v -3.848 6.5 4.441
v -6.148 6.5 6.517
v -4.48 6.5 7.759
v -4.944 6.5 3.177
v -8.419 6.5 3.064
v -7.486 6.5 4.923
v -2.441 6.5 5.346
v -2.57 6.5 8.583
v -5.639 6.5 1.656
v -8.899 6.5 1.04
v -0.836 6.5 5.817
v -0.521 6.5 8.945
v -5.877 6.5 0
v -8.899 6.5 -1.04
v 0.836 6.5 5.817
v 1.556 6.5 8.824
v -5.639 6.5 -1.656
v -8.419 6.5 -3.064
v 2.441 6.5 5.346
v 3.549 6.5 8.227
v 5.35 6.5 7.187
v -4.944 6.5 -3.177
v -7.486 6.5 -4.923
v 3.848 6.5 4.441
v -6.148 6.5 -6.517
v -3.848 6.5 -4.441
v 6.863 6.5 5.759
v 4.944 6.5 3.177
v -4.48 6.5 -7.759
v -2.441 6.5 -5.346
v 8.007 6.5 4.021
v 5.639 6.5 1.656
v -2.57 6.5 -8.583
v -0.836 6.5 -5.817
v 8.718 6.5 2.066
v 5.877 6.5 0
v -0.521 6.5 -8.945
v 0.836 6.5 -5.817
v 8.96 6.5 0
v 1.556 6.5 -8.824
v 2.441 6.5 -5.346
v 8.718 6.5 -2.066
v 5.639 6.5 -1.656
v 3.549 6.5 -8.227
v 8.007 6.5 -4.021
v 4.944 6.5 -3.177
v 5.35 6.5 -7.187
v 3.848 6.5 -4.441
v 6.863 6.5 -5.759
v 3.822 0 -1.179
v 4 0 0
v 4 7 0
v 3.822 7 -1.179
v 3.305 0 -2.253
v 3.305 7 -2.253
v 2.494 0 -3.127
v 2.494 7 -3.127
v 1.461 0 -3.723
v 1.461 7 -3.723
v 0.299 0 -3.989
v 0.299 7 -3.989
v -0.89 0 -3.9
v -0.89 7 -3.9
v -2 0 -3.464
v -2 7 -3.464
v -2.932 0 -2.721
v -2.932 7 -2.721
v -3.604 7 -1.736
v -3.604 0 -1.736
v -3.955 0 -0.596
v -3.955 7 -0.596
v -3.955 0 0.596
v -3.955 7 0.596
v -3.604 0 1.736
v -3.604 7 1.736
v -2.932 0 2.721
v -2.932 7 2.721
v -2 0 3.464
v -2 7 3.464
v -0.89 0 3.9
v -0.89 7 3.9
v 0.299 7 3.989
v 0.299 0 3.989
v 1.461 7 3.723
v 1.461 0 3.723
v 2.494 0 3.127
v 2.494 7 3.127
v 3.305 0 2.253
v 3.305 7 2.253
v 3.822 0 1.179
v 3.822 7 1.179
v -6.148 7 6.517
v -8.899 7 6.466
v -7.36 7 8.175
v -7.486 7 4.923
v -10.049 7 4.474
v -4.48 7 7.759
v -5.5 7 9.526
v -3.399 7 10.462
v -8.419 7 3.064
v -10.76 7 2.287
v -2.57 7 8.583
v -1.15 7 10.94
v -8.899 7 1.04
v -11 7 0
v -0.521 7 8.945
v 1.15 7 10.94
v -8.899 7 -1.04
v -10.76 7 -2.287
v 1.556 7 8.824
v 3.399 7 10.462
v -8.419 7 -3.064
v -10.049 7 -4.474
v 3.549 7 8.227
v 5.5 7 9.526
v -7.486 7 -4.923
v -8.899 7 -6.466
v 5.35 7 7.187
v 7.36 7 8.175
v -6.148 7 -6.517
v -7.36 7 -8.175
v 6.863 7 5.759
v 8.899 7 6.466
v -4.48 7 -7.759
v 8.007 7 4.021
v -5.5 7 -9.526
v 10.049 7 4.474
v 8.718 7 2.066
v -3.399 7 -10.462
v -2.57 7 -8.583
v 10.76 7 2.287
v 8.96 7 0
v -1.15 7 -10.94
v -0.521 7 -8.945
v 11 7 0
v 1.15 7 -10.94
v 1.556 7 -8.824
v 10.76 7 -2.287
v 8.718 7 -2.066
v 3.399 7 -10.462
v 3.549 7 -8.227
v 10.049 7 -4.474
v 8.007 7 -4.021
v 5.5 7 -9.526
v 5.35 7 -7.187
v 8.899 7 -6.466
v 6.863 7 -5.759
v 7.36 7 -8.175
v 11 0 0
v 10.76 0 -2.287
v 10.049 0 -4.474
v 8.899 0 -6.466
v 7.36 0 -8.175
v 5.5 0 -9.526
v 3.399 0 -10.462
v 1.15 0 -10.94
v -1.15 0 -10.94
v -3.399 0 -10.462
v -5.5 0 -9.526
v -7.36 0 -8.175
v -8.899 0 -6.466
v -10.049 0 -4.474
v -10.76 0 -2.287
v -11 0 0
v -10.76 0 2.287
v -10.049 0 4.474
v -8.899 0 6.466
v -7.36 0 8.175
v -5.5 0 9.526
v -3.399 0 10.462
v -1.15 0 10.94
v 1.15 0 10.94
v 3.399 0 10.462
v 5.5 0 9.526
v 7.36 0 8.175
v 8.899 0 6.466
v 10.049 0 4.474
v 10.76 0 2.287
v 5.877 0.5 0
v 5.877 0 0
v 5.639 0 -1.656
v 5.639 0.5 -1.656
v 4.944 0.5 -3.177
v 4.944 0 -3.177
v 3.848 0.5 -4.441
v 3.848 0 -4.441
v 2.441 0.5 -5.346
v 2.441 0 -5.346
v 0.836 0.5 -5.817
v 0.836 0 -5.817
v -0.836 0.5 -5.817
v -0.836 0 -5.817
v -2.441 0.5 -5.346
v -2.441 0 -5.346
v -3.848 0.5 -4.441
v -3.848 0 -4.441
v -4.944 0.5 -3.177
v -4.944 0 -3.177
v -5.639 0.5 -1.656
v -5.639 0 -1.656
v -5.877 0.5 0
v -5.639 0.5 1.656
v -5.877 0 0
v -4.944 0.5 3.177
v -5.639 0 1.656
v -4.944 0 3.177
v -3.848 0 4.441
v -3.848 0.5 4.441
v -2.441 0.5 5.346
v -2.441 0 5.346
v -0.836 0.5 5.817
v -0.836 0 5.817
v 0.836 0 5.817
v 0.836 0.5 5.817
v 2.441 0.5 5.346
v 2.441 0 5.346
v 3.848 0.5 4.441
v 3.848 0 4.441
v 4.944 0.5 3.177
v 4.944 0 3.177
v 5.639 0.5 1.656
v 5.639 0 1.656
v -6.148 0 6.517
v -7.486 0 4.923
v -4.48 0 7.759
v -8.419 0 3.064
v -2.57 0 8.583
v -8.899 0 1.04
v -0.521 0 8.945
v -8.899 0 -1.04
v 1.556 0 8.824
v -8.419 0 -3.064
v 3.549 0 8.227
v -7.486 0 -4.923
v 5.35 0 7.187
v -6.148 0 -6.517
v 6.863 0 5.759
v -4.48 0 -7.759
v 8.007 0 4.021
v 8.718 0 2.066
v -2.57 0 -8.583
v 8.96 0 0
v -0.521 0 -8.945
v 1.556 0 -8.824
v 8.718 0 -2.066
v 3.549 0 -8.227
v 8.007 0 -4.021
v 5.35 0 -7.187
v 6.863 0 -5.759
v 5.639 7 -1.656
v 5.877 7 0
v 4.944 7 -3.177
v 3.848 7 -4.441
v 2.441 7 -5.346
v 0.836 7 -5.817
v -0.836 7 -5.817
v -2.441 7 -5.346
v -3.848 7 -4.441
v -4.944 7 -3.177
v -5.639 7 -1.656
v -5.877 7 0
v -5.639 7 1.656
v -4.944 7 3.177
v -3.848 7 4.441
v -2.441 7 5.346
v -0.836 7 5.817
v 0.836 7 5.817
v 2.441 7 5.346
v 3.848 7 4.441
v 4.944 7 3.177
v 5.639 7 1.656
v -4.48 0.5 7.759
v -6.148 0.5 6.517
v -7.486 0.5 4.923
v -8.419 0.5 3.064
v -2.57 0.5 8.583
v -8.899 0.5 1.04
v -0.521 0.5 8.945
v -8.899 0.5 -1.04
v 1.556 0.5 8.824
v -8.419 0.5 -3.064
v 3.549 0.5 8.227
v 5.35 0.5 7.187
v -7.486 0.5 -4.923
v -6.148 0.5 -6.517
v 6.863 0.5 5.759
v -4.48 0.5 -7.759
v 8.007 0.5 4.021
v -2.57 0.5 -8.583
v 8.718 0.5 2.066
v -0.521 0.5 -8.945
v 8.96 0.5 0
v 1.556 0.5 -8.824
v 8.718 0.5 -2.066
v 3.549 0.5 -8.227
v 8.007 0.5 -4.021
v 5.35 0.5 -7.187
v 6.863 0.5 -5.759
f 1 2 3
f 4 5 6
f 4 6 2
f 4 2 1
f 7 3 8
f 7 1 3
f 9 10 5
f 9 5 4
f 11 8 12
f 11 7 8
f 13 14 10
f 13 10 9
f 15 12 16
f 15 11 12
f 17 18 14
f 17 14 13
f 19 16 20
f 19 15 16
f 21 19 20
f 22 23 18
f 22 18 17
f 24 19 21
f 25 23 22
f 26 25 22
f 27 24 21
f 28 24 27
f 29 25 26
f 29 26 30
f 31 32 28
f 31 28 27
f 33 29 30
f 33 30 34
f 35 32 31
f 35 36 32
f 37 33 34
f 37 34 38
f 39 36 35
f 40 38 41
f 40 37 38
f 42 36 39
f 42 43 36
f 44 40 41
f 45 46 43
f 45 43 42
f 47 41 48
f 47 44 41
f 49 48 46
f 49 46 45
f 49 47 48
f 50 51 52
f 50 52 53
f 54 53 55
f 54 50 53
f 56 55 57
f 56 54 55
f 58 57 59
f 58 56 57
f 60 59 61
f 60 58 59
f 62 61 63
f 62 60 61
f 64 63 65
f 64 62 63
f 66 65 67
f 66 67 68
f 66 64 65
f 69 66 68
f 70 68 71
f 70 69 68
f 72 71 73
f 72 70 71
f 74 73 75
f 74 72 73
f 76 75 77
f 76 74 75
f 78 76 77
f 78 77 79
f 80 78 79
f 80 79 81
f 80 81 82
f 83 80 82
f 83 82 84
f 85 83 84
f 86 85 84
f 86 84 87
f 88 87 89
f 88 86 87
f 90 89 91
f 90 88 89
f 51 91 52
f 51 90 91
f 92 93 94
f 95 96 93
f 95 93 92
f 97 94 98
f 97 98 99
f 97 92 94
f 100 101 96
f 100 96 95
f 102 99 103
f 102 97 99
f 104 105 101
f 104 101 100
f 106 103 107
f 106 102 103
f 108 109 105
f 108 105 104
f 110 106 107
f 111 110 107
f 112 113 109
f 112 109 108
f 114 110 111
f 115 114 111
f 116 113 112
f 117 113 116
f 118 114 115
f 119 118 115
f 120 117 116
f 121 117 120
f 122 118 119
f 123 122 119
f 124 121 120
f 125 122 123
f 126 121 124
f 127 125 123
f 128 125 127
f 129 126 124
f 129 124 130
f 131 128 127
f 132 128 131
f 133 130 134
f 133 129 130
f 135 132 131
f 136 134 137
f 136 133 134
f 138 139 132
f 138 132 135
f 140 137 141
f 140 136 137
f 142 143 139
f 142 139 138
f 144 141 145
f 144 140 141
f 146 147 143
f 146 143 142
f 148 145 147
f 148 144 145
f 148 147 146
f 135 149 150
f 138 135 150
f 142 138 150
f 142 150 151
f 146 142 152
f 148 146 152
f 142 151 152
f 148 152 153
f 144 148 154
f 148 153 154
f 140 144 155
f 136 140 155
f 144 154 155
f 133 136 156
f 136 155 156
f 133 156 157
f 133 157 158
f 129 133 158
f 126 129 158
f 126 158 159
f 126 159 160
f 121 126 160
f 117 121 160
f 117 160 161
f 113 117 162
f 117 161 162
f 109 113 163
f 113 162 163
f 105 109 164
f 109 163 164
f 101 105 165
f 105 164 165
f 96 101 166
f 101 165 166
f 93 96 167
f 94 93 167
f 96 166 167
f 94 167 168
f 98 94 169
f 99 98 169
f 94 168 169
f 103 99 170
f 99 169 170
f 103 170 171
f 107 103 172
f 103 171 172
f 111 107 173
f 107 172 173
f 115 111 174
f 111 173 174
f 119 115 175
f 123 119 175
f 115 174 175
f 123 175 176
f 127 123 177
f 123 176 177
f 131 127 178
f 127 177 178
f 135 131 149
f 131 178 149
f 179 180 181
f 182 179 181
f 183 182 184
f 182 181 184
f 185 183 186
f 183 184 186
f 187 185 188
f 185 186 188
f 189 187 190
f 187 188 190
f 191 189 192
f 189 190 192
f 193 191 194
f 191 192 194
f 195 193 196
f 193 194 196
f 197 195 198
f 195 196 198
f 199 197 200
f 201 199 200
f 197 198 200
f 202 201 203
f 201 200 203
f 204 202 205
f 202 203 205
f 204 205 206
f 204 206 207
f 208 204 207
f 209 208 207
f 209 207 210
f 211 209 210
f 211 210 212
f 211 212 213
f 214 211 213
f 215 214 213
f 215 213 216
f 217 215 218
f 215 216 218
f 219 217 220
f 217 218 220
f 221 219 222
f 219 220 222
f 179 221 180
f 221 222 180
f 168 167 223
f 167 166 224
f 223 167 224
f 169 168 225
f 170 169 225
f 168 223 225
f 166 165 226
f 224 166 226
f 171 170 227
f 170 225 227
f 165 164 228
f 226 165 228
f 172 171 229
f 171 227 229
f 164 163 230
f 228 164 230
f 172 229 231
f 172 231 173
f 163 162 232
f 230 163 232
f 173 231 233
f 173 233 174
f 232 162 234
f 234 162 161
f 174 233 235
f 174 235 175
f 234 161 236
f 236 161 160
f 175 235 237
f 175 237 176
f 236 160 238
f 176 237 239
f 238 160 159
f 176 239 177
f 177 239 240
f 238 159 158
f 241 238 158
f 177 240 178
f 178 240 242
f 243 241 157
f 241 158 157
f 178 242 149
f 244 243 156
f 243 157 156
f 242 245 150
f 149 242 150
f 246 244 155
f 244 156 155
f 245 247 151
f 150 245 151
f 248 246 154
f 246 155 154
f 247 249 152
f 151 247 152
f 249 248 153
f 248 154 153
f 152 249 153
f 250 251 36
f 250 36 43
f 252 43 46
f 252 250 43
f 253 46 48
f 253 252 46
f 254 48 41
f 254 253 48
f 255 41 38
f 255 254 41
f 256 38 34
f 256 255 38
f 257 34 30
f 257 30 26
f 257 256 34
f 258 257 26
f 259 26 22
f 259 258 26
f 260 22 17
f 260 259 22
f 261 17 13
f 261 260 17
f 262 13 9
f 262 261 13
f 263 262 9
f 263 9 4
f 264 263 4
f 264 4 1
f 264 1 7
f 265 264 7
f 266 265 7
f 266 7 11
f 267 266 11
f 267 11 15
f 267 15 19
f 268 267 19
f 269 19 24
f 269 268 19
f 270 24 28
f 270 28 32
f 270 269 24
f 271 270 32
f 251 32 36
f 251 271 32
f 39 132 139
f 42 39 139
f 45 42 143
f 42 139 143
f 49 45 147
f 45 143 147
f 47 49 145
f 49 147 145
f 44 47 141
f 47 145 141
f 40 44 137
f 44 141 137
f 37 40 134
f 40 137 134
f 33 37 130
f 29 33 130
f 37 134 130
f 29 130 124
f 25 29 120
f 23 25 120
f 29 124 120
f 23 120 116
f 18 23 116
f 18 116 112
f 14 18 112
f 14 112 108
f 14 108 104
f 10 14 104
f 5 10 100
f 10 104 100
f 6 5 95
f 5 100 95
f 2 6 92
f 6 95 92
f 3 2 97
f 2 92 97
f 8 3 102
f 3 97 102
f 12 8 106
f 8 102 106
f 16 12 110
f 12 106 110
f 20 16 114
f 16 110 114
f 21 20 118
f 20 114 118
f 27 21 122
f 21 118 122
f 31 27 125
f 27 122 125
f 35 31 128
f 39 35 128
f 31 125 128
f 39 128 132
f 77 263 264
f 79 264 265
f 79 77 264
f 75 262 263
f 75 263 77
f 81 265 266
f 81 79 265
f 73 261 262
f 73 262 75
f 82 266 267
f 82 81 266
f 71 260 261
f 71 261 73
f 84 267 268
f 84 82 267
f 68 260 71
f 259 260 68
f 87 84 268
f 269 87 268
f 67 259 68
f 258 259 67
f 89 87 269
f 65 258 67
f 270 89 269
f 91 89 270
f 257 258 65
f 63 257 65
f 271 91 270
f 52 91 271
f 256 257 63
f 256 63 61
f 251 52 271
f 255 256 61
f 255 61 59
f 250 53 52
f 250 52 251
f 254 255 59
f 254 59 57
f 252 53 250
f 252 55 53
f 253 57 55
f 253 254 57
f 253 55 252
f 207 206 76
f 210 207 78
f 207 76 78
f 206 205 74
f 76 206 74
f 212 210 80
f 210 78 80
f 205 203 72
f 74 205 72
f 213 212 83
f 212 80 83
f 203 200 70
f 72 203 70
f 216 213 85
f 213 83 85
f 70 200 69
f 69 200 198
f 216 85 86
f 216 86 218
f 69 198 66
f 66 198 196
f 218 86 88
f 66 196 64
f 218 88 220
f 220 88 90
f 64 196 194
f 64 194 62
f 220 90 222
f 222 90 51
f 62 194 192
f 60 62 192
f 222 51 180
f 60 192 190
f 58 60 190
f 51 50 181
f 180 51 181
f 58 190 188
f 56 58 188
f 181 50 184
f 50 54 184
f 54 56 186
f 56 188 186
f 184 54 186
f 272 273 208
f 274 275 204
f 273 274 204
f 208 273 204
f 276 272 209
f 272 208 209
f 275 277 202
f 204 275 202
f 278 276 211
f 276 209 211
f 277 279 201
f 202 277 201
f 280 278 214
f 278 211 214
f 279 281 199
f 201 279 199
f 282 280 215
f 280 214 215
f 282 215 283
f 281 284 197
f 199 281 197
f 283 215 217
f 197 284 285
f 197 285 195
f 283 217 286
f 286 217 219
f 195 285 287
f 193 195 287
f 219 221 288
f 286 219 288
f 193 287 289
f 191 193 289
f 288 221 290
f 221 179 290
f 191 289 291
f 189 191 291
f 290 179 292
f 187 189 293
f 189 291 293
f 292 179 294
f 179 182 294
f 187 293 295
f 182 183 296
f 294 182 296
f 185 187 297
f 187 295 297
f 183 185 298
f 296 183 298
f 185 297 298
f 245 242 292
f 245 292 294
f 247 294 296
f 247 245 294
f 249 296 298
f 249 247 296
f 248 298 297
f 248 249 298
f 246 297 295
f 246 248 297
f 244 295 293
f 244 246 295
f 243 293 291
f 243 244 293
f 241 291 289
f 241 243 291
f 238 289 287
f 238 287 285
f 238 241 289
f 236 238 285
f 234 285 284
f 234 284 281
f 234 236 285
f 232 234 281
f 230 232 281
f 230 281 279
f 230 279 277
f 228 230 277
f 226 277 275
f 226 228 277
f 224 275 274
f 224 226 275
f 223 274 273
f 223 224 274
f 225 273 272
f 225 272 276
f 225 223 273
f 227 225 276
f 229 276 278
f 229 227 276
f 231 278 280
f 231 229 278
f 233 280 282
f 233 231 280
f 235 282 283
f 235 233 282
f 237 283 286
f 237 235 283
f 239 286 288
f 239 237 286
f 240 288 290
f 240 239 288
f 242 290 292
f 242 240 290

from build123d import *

# Parameters (mm, degrees)
ESQUISSE1_R             = 11
ESQUISSE1_R_2           = 4
BOSS_EXTRU_1_DEPTH      = 7
ESQUISSE2_R             = 8.959660805
ESQUISSE2_R_2           = 5.876621398
ENL_V_MAT_EXTRU_1_DEPTH = 0.5


with BuildPart() as part:
    # Esquisse1 → Boss.-Extru.1 (new body)
    with BuildSketch(Plane(origin=(0, 0, 0), x_dir=(1, 0, 0), z_dir=(0, 1, 0))):
        Circle(ESQUISSE1_R)
        Circle(ESQUISSE1_R_2, mode=Mode.SUBTRACT)
    extrude(amount=BOSS_EXTRU_1_DEPTH)

    # Esquisse2 → Enlèv. mat.-Extru.1 (cut)
    with BuildSketch(Plane(origin=(0, 7, 0), x_dir=(1, 0, 0), z_dir=(0, 1, 0))):
        Circle(ESQUISSE2_R)
        Circle(ESQUISSE2_R_2, mode=Mode.SUBTRACT)
    enl_v_mat_extru_1 = extrude(amount=-ENL_V_MAT_EXTRU_1_DEPTH, mode=Mode.SUBTRACT)

    # Symétrie1: Enlèv. mat.-Extru.1 across plane
    add(enl_v_mat_extru_1.mirror(Plane.ZX.offset(3.5)), mode=Mode.SUBTRACT)


solid = part.part
